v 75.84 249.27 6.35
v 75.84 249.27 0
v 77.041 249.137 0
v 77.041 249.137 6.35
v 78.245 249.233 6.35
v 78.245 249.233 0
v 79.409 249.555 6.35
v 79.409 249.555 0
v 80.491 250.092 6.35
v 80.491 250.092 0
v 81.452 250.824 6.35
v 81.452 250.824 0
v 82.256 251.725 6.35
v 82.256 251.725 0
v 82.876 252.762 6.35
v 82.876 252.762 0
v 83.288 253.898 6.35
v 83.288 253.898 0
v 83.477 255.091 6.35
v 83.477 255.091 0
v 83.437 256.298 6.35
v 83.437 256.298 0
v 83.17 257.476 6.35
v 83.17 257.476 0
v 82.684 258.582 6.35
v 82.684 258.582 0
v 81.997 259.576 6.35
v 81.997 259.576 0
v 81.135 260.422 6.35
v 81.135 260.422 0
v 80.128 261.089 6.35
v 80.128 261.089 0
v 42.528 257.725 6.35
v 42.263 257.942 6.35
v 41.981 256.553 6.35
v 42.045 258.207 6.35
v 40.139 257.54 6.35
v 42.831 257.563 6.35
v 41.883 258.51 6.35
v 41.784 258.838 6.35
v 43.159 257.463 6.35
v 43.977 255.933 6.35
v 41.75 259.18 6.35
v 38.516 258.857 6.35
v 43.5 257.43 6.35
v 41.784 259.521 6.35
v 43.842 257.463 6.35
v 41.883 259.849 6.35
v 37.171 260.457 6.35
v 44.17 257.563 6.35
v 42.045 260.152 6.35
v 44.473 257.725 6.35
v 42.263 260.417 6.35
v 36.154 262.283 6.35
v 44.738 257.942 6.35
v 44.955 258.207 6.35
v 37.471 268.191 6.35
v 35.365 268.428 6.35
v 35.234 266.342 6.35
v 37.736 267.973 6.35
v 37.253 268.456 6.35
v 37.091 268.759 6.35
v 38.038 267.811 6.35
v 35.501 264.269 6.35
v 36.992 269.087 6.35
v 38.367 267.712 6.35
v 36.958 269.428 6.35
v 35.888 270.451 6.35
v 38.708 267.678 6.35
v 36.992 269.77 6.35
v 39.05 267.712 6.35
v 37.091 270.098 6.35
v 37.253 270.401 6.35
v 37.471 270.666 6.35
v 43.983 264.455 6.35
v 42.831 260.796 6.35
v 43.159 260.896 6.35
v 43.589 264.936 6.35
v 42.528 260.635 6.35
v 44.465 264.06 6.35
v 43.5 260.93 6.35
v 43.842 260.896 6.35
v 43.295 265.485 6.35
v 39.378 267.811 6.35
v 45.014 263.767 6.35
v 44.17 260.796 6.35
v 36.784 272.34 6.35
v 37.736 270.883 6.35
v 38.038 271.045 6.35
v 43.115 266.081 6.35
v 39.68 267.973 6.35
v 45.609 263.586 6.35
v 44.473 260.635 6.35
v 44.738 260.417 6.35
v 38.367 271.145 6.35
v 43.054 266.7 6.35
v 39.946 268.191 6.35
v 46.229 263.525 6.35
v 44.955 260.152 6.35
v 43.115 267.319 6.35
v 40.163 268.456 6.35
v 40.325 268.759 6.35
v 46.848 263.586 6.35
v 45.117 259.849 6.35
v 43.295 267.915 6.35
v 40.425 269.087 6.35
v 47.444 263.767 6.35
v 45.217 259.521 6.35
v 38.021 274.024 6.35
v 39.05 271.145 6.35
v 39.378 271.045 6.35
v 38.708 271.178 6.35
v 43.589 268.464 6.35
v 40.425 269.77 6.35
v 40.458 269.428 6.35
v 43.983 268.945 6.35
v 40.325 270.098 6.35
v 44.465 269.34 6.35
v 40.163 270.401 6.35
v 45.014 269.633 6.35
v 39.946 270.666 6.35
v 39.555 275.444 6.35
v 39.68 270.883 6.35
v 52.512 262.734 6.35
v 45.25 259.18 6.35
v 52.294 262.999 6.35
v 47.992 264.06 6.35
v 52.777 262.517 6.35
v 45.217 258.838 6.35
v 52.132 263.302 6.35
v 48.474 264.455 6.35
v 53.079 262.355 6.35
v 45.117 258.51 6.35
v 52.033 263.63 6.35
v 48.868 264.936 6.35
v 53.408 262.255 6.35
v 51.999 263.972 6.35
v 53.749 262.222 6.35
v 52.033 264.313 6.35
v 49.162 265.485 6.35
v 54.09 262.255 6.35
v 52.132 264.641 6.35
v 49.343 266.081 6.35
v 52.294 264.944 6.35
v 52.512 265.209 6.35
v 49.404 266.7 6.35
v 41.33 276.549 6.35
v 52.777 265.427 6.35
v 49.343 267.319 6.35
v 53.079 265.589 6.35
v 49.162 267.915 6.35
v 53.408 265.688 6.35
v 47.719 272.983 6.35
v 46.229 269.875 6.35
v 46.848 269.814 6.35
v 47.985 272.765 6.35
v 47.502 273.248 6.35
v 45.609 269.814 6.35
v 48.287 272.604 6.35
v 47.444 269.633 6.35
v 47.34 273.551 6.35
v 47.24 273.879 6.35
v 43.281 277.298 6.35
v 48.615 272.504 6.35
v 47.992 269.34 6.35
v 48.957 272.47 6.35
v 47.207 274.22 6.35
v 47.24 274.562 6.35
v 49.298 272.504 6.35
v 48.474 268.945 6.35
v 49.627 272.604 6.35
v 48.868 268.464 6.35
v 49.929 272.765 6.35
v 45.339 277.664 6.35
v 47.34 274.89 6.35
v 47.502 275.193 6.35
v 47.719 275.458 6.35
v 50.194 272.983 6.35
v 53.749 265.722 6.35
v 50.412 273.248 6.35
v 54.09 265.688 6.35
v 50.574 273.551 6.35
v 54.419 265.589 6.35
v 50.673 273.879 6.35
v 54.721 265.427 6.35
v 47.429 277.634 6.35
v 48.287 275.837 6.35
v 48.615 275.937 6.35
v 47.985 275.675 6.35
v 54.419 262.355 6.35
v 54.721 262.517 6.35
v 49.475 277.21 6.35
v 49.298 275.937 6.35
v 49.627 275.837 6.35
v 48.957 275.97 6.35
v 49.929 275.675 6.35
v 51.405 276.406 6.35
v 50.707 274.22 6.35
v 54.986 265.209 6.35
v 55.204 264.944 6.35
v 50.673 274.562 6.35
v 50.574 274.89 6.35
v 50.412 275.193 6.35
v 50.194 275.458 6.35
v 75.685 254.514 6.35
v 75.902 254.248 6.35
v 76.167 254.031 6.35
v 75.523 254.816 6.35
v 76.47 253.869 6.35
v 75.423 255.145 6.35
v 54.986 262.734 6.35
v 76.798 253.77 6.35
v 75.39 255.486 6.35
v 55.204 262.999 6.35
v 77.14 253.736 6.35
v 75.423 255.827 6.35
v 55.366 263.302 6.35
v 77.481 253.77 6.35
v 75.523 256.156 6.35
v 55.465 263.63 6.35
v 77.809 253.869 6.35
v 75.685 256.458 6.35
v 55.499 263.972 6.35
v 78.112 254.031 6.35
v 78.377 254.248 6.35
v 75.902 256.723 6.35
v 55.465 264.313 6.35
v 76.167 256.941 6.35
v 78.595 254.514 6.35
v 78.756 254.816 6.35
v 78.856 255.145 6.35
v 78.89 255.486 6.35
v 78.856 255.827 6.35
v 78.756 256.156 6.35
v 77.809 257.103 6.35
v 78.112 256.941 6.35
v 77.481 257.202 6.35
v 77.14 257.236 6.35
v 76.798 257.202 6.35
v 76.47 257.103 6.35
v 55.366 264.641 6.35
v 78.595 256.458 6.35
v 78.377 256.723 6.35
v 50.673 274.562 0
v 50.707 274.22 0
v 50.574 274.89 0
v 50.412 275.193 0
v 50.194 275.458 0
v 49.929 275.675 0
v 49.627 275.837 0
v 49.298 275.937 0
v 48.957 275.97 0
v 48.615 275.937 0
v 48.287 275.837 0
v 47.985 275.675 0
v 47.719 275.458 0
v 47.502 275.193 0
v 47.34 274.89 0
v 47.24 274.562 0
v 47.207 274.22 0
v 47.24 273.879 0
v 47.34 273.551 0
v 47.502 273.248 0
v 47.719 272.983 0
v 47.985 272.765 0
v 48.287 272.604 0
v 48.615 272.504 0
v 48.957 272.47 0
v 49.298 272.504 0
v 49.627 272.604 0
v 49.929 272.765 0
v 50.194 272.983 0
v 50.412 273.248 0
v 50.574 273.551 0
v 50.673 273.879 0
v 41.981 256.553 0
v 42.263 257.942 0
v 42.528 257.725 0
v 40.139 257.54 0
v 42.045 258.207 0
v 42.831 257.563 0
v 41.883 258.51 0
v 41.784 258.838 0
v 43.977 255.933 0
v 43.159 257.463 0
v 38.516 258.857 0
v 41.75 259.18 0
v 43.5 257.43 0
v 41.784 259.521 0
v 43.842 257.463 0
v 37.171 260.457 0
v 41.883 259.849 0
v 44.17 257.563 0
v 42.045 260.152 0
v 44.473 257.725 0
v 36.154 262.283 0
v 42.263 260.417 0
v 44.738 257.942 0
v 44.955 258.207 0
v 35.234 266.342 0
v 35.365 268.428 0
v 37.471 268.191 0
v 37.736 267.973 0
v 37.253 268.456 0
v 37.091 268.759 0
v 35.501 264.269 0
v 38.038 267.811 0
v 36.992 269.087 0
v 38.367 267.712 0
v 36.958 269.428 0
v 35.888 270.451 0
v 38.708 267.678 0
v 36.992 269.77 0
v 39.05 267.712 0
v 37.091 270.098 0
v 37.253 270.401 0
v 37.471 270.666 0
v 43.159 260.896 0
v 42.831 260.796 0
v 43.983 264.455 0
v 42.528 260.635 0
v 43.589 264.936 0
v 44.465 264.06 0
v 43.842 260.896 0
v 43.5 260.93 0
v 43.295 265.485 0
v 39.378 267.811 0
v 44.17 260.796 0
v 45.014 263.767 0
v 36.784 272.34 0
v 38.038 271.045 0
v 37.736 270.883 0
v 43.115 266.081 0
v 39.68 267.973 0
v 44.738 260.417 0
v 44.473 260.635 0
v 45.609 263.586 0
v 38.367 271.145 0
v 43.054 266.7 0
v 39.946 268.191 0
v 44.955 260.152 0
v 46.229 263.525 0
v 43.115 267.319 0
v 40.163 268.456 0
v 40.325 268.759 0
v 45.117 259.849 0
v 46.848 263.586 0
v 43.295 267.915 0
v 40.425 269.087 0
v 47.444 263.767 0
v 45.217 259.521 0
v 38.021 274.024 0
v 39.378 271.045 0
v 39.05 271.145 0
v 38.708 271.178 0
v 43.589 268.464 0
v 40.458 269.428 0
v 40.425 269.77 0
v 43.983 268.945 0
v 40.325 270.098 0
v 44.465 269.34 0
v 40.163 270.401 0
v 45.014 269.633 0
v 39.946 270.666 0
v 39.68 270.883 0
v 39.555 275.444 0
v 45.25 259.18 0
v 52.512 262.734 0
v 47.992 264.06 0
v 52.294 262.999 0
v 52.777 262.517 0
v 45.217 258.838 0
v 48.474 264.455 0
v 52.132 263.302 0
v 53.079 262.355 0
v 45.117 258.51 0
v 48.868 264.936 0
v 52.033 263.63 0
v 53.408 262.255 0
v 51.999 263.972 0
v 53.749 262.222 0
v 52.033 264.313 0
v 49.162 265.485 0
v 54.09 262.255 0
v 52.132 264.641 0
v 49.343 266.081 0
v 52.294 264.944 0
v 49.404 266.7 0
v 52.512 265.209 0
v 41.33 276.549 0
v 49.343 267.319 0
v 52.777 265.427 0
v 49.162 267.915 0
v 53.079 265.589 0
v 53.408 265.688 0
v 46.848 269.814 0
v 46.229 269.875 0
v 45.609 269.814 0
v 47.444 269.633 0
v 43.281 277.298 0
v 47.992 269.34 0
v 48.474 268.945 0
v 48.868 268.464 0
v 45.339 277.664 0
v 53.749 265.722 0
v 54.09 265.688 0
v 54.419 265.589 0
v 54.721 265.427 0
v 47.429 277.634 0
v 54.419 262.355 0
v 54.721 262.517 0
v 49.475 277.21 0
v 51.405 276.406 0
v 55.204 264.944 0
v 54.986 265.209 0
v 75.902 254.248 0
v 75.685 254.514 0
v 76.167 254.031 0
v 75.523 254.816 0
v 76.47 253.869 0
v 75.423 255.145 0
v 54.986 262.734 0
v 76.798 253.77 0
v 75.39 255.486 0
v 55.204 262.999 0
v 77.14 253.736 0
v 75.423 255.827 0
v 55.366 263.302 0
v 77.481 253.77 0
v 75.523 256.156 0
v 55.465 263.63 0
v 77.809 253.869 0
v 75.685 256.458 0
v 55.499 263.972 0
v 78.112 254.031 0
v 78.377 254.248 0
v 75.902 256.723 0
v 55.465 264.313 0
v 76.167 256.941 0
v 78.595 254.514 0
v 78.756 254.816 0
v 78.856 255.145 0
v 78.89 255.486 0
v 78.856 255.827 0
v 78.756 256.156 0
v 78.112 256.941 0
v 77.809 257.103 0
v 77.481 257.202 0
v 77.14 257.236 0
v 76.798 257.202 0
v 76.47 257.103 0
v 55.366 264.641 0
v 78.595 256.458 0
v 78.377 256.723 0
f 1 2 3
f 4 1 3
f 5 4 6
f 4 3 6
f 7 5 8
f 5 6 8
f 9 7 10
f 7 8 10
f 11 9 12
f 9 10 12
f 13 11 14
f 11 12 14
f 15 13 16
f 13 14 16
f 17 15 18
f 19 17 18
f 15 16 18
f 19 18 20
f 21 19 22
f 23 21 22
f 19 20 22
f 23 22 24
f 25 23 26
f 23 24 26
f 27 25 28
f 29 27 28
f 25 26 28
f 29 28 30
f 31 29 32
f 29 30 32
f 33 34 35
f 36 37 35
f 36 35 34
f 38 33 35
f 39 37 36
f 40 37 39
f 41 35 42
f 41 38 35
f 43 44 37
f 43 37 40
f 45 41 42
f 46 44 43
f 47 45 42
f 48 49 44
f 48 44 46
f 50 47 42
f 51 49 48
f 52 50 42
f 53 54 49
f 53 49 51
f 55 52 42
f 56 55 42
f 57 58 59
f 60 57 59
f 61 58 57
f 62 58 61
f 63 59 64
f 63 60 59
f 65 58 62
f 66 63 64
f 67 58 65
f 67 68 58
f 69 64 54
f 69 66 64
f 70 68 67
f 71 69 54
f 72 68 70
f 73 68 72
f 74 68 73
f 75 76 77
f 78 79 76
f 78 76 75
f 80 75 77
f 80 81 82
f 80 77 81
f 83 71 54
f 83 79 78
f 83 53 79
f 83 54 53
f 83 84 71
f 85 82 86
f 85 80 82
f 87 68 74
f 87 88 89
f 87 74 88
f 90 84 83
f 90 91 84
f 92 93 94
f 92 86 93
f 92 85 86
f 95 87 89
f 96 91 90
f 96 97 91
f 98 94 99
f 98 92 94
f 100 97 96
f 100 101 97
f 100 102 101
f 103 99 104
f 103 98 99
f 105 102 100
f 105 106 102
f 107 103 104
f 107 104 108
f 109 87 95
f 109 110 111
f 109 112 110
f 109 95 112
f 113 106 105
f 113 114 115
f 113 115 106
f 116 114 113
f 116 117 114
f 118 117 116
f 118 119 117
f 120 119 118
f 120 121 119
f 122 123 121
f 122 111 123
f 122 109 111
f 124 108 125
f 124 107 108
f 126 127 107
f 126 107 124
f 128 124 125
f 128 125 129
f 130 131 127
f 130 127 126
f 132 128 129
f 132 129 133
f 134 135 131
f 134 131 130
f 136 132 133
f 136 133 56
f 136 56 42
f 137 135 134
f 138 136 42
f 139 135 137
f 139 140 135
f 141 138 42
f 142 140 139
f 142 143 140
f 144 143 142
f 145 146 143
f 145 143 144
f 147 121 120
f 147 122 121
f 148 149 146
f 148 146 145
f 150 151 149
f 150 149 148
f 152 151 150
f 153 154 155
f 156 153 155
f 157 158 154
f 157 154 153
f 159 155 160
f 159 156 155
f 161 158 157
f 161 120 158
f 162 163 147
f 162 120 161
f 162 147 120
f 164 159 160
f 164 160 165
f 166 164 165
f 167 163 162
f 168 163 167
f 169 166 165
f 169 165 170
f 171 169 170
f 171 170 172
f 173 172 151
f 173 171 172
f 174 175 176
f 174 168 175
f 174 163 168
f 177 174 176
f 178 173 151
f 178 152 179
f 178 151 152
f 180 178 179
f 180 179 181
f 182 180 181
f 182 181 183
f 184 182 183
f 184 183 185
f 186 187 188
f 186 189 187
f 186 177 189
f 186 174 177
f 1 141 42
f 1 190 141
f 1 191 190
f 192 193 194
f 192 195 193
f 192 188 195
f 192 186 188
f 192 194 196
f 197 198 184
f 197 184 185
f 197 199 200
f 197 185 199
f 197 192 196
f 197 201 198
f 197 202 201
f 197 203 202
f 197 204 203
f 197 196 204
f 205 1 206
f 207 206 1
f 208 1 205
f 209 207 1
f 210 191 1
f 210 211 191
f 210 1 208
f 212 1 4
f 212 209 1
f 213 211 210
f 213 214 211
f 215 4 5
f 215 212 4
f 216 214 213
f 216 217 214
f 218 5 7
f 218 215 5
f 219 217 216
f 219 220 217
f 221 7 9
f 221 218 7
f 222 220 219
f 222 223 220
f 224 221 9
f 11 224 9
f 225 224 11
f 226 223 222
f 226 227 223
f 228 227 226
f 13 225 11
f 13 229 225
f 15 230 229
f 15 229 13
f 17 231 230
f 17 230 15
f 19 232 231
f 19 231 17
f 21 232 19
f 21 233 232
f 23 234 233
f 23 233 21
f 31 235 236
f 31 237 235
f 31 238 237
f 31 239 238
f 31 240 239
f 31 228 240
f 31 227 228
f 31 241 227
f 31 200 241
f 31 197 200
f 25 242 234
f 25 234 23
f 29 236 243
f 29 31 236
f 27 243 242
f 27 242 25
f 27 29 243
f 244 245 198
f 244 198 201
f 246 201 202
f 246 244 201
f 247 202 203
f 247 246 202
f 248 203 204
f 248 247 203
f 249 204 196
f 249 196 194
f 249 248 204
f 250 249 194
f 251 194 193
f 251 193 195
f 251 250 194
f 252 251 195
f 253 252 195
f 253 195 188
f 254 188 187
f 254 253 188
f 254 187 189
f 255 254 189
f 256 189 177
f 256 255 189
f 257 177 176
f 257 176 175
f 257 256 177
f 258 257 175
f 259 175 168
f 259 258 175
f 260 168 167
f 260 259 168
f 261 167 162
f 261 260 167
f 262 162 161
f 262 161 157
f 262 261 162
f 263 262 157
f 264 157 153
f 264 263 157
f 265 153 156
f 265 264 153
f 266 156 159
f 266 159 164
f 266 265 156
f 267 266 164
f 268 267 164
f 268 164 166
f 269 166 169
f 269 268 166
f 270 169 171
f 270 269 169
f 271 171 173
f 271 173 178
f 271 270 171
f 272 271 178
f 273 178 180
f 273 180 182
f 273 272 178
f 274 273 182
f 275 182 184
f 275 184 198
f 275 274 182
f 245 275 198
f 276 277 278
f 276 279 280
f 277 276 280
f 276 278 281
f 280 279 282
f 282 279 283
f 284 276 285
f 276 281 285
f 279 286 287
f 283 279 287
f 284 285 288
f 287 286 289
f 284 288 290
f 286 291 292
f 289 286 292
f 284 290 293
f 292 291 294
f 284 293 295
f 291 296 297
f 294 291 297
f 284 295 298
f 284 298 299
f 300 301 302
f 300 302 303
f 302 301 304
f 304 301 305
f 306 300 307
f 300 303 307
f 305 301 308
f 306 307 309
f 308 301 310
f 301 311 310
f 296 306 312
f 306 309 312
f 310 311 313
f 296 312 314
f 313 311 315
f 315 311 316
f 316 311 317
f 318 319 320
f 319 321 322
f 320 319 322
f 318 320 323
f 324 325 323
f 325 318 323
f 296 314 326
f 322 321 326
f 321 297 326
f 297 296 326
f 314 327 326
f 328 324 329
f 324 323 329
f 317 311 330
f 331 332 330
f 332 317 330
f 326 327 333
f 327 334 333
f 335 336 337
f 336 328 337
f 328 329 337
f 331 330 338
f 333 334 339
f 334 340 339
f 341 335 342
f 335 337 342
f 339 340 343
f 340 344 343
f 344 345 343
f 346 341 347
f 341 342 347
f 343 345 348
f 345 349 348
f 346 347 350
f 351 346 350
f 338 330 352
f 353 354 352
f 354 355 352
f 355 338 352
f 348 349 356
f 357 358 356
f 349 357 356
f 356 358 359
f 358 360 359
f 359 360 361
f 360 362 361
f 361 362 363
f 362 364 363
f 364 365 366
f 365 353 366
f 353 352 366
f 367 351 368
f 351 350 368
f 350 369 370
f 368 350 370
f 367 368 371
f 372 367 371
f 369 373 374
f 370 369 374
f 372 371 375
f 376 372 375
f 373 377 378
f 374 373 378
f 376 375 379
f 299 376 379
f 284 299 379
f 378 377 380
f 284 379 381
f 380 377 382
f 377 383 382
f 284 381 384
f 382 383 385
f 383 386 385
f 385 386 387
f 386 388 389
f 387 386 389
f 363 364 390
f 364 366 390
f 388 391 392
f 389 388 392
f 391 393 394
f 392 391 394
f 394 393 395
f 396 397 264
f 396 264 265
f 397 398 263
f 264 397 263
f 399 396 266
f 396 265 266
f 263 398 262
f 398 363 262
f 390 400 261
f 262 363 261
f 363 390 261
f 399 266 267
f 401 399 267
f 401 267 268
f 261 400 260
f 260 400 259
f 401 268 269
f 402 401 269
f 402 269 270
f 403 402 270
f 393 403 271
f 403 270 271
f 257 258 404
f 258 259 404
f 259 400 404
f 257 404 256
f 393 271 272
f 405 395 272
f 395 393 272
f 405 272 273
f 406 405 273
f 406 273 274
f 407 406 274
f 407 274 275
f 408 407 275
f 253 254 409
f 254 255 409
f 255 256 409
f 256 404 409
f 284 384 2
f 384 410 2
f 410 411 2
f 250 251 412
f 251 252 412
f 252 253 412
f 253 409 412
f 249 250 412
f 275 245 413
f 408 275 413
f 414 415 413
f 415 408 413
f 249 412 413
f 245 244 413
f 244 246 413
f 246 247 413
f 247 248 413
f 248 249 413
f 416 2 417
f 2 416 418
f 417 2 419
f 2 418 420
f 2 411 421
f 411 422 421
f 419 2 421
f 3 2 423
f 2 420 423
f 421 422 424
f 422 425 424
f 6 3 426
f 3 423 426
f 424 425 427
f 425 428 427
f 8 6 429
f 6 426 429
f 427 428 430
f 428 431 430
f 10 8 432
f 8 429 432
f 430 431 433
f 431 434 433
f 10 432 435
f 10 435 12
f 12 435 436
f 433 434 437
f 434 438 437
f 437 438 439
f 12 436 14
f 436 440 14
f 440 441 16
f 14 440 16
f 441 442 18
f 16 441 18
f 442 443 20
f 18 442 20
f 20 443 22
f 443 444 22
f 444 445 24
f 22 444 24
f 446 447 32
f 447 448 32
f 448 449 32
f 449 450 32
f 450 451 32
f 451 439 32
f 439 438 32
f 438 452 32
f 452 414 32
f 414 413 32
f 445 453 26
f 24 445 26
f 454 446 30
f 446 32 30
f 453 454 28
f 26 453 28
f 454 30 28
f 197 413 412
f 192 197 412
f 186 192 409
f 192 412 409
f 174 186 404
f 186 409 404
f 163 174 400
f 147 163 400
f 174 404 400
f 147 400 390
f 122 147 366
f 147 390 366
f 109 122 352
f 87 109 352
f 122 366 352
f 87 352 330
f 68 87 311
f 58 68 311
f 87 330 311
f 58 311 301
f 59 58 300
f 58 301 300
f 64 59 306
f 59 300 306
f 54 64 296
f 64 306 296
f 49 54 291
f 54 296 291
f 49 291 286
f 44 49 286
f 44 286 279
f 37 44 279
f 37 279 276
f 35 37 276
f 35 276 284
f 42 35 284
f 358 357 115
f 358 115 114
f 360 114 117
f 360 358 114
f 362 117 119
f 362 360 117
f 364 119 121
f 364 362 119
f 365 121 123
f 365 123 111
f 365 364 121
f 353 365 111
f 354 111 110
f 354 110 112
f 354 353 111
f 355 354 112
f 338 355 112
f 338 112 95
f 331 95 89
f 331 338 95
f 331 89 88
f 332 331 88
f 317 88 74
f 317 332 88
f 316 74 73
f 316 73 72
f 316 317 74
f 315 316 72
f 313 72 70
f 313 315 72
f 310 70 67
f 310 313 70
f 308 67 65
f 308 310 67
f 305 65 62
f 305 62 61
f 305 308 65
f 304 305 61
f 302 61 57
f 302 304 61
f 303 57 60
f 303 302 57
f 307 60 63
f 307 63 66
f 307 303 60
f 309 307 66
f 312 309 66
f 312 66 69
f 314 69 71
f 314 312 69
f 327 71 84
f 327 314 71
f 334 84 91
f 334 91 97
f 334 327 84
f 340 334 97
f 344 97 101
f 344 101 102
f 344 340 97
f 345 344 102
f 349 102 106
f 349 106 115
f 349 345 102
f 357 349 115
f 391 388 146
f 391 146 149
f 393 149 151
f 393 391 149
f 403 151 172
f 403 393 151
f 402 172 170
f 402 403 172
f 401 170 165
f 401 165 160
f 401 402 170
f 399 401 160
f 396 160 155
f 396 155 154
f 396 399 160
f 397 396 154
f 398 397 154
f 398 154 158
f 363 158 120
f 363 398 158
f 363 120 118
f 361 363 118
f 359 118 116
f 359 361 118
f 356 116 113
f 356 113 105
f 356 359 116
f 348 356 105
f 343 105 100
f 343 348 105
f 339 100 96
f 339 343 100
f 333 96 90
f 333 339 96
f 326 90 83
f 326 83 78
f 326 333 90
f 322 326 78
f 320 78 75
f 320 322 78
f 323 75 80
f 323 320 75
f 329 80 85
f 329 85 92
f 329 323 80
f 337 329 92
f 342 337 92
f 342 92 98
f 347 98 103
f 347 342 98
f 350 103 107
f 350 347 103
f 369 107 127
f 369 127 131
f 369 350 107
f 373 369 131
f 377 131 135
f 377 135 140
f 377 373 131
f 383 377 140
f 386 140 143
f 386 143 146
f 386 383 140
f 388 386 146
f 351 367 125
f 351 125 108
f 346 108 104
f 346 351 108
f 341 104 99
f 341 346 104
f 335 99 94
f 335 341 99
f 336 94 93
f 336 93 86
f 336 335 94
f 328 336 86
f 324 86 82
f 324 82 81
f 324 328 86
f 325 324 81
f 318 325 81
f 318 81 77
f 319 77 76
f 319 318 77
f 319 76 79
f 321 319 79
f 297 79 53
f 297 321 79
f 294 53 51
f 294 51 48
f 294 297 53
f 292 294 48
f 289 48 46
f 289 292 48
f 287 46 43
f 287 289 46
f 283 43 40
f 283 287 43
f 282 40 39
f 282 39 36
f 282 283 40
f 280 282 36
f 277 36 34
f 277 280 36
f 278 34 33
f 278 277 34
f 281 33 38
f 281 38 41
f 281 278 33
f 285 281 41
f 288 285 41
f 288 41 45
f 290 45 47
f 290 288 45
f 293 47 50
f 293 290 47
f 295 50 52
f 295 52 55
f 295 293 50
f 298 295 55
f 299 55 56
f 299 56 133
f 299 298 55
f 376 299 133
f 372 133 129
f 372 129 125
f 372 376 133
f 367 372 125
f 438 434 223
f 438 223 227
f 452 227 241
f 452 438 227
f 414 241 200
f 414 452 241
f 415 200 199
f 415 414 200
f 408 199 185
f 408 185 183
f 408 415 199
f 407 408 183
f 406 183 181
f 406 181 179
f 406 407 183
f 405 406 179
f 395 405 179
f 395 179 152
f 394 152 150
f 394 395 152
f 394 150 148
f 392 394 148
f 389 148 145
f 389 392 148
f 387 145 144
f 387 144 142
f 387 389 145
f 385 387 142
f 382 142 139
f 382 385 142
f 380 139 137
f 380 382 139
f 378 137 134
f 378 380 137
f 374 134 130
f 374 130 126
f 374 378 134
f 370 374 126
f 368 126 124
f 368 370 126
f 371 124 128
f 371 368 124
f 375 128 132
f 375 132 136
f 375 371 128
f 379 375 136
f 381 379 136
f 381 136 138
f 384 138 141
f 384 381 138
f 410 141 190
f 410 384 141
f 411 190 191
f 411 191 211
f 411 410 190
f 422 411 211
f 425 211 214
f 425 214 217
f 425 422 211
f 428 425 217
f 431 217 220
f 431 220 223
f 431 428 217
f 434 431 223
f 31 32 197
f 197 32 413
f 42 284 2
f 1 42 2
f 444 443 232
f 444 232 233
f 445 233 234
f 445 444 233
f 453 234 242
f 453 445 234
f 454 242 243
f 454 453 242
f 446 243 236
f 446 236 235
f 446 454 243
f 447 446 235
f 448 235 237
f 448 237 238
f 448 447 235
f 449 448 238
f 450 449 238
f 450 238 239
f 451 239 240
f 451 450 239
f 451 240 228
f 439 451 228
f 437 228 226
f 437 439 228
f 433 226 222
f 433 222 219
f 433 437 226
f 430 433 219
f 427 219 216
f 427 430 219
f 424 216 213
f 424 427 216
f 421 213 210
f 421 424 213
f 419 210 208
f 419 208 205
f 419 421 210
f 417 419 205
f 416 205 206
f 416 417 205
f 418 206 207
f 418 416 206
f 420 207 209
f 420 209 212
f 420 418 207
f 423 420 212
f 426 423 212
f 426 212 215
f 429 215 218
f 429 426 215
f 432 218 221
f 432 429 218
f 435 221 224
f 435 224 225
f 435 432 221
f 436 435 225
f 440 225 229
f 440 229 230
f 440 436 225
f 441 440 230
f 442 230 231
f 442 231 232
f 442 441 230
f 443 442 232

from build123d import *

# Parameters (mm, degrees)
SKETCH4_R           = 3.175
SKETCH4_R_2         = 1.75
BOSS_EXTRUDE1_DEPTH = 6.35


with BuildPart() as part:
    # Sketch4 → Boss-Extrude1 (new body)
    with BuildSketch(Plane.XY):
        with BuildLine():
            Line((43.977135669, 255.932866189), (75.839955751, 249.270355141))
            ThreePointArc((75.839955751, 249.270355141), (83.108950302, 253.320349798), (80.127586616, 261.089018222))
            Line((80.127586616, 261.089018222), (51.40452772, 276.406140819))
            ThreePointArc((51.40452772, 276.406140819), (35.887988835, 270.451395034), (43.977135669, 255.932866189))
        make_face()
        with Locations((46.228541785, 266.7)):
            Circle(SKETCH4_R, mode=Mode.SUBTRACT)
        with Locations((53.74894393, 263.971712703)):
            Circle(SKETCH4_R_2, mode=Mode.SUBTRACT)
        with Locations((77.139631099, 255.485927841)):
            Circle(SKETCH4_R_2, mode=Mode.SUBTRACT)
        with Locations((43.500254487, 259.179597855)):
            Circle(SKETCH4_R_2, mode=Mode.SUBTRACT)
        with Locations((38.708139639, 269.428287297)):
            Circle(SKETCH4_R_2, mode=Mode.SUBTRACT)
        with Locations((48.956829082, 274.220402145)):
            Circle(SKETCH4_R_2, mode=Mode.SUBTRACT)
    extrude(amount=BOSS_EXTRUDE1_DEPTH)


solid = part.part
